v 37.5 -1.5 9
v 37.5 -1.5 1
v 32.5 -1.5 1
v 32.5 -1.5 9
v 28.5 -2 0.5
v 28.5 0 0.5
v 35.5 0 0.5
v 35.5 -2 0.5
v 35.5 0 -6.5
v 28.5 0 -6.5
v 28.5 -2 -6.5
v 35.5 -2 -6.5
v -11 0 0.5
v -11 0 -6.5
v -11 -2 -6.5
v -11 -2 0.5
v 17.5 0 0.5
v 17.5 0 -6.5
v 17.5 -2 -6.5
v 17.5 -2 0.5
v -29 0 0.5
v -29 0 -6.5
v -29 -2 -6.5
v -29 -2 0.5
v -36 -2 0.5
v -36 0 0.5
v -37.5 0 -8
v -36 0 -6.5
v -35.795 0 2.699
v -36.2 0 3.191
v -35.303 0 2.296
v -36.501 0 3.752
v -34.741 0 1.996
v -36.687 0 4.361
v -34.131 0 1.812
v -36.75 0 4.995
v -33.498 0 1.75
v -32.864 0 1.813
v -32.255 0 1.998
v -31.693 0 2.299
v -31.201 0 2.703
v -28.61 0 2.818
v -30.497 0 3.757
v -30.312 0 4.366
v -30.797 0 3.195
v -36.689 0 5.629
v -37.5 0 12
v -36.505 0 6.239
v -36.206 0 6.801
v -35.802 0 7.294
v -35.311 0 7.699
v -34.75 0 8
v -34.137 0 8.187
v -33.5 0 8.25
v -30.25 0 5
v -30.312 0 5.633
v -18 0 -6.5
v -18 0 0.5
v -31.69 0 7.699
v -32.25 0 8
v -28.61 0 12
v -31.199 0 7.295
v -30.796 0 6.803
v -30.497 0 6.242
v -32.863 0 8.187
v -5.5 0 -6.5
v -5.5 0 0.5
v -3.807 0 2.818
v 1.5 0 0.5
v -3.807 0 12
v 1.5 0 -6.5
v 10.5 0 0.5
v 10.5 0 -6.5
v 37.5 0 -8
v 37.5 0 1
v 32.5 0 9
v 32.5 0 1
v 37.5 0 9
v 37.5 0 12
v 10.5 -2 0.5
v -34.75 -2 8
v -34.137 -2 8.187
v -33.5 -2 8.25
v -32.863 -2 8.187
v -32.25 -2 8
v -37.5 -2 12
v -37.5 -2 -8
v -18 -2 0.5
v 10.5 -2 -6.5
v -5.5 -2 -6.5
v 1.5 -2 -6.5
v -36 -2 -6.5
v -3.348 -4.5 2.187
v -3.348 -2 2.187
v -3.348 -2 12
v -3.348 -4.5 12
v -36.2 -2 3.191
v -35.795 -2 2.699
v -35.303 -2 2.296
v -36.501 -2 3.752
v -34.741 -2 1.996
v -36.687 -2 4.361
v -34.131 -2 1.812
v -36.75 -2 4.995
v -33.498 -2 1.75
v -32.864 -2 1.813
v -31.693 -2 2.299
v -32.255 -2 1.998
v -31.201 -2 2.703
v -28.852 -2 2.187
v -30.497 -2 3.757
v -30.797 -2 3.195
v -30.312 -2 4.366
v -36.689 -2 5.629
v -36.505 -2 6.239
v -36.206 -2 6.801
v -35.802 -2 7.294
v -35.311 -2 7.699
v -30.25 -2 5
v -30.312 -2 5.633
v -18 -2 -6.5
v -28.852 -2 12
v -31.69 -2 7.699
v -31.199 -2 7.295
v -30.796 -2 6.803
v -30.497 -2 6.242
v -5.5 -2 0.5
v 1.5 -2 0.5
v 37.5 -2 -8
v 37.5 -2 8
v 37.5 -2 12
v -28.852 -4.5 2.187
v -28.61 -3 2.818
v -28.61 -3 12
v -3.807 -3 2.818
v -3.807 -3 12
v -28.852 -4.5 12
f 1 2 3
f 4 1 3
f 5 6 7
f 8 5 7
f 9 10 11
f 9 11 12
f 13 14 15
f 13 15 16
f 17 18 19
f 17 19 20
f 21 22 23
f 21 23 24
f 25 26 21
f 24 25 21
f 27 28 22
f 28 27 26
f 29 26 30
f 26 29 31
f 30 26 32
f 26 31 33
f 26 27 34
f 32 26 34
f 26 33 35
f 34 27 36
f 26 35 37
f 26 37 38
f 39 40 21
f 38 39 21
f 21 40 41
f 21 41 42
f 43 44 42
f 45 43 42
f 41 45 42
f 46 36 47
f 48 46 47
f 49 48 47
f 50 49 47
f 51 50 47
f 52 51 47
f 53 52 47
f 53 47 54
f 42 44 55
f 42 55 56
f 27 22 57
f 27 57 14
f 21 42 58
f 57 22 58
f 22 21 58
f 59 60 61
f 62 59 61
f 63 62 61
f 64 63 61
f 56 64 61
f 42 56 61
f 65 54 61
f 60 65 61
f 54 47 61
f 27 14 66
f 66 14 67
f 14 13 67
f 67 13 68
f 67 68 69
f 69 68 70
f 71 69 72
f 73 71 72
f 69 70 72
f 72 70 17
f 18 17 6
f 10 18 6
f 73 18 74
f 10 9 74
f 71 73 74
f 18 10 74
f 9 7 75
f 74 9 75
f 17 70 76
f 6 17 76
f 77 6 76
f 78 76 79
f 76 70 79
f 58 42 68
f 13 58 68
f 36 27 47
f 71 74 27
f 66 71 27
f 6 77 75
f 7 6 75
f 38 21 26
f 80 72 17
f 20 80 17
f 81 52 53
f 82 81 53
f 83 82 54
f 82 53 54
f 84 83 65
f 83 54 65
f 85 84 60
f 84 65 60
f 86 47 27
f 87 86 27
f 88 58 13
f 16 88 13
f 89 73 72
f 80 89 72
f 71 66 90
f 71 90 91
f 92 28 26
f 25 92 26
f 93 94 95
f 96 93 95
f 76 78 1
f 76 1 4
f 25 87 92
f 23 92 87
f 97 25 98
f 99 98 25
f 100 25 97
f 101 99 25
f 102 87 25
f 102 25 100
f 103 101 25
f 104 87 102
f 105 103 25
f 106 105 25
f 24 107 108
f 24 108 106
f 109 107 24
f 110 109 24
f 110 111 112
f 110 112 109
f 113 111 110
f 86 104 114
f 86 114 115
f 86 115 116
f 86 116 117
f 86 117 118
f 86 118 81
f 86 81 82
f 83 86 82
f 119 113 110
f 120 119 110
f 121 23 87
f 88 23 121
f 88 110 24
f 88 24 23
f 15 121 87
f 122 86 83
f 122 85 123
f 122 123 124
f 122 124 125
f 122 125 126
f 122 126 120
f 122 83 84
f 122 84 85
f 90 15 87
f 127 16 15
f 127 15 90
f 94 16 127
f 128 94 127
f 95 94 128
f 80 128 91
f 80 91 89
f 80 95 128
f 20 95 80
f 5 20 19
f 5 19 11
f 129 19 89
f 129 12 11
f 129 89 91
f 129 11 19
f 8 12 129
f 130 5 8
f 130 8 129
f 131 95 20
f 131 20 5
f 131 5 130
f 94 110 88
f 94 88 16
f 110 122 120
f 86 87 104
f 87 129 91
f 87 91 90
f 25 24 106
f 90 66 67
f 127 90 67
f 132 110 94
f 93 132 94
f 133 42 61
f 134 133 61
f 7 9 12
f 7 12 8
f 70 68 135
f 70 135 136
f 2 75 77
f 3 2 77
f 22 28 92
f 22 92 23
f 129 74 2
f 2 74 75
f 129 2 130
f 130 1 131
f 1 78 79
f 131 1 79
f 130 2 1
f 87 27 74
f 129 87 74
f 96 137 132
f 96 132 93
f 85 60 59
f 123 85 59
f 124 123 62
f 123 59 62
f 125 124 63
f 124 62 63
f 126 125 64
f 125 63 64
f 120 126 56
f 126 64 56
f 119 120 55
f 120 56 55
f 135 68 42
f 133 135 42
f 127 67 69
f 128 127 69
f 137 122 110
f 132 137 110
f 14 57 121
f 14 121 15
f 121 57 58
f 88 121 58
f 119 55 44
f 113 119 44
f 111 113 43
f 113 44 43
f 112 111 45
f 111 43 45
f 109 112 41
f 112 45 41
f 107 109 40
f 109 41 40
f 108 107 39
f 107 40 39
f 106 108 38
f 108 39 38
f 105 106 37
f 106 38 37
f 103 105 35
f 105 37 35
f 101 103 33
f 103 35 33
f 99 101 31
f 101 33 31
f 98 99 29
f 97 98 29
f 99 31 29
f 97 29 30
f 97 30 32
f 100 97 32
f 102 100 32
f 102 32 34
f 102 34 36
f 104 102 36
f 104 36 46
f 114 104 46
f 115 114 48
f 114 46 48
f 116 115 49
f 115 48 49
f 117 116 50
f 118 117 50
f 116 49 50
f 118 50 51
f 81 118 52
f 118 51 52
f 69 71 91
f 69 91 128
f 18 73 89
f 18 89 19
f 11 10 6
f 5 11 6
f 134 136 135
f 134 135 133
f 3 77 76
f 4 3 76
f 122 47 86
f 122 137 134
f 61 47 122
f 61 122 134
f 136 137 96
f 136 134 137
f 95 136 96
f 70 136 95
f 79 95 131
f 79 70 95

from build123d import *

# Parameters (mm, degrees)
F0_W     = 40.8479798585
F0_H     = 4
F0_W_2   = 7
F0_H_2   = 7
F1_DEPTH = 2
F0_W_3   = 25.5042742938
F0_H_3   = 5.8133912664
F2_DEPTH = 4.5
F4_W     = 5
F4_H     = 8
F5_DEPTH = 1.5
F6_W     = 24.8026130721
F6_H     = 9.2125886586
F7_DEPTH = 3


with BuildPart() as f1:
    # F0 (on Front) → F1 (new body)
    with BuildSketch(Plane.XZ):
        with Locations((17.0760100707, 10)):
            Rectangle(F0_W, F0_H)
        with BuildLine():
            Line((-37.5, 12), (-37.5, 8))
            Line((-37.5, 8), (-34.75, 8))
            ThreePointArc((-34.75, 8), (-33.5, 8.25), (-32.25, 8))
            Line((-32.25, 8), (-28.8522541523, 8))
            Line((-28.8522541523, 8), (-28.8522541523, 12))
            Line((-28.8522541523, 12), (-37.5, 12))
        make_face()
        with BuildLine():
            Line((-37.5, 8), (-37.5, -8))
            Line((-37.5, -8), (37.5, -8))
            Line((37.5, -8), (37.5, 8))
            Line((37.5, 8), (-3.3479798585, 8))
            Line((-3.3479798585, 8), (-3.3479798585, 2.1866087336))
            Line((-3.3479798585, 2.1866087336), (-28.8522541523, 2.1866087336))
            Line((-28.8522541523, 2.1866087336), (-28.8522541523, 8))
            Line((-28.8522541523, 8), (-32.25, 8))
            ThreePointArc((-32.25, 8), (-30.7958365434, 6.8027756377), (-30.25, 5))
            ThreePointArc((-30.25, 5), (-35.3027756377, 2.2958365434), (-34.75, 8))
            Line((-34.75, 8), (-37.5, 8))
        make_face()
        with Locations((-32.5, -3)):
            Rectangle(F0_W_2, F0_H_2, mode=Mode.SUBTRACT)
        with Locations((-14.5, -3)):
            Rectangle(F0_W_2, F0_H_2, mode=Mode.SUBTRACT)
        with Locations((-2, -3)):
            Rectangle(F0_W_2, F0_H_2, mode=Mode.SUBTRACT)
        with Locations((14, -3)):
            Rectangle(F0_W_2, F0_H_2, mode=Mode.SUBTRACT)
        with Locations((32, -3)):
            Rectangle(F0_W_2, F0_H_2, mode=Mode.SUBTRACT)
    extrude(amount=F1_DEPTH)

    # F0 (on Front) → F2 (join)
    with BuildSketch(Plane.XZ):
        with Locations((-16.1001170054, 10)):
            Rectangle(F0_W_3, F0_H)
        with Locations((-16.1001170054, 5.0933043668)):
            Rectangle(F0_W_3, F0_H_3)
    extrude(amount=F2_DEPTH)

    # F4 (on face) → F5 (cut)
    with BuildSketch(Plane(origin=(0, 0, 0), x_dir=(-1, 0, 0), z_dir=(0, 1, 0))):
        with Locations((-35, 5)):
            Rectangle(F4_W, F4_H)
    extrude(amount=-F5_DEPTH, mode=Mode.SUBTRACT)

    # F6 (on face) → F7 (cut)
    with BuildSketch(Plane(origin=(0, 0, 0), x_dir=(-1, 0, 0), z_dir=(0, 1, 0))):
        with Locations((16.2086286582, 7.4240994873)):
            Rectangle(F6_W, F6_H)
    extrude(amount=-F7_DEPTH, mode=Mode.SUBTRACT)


solid = f1.part
